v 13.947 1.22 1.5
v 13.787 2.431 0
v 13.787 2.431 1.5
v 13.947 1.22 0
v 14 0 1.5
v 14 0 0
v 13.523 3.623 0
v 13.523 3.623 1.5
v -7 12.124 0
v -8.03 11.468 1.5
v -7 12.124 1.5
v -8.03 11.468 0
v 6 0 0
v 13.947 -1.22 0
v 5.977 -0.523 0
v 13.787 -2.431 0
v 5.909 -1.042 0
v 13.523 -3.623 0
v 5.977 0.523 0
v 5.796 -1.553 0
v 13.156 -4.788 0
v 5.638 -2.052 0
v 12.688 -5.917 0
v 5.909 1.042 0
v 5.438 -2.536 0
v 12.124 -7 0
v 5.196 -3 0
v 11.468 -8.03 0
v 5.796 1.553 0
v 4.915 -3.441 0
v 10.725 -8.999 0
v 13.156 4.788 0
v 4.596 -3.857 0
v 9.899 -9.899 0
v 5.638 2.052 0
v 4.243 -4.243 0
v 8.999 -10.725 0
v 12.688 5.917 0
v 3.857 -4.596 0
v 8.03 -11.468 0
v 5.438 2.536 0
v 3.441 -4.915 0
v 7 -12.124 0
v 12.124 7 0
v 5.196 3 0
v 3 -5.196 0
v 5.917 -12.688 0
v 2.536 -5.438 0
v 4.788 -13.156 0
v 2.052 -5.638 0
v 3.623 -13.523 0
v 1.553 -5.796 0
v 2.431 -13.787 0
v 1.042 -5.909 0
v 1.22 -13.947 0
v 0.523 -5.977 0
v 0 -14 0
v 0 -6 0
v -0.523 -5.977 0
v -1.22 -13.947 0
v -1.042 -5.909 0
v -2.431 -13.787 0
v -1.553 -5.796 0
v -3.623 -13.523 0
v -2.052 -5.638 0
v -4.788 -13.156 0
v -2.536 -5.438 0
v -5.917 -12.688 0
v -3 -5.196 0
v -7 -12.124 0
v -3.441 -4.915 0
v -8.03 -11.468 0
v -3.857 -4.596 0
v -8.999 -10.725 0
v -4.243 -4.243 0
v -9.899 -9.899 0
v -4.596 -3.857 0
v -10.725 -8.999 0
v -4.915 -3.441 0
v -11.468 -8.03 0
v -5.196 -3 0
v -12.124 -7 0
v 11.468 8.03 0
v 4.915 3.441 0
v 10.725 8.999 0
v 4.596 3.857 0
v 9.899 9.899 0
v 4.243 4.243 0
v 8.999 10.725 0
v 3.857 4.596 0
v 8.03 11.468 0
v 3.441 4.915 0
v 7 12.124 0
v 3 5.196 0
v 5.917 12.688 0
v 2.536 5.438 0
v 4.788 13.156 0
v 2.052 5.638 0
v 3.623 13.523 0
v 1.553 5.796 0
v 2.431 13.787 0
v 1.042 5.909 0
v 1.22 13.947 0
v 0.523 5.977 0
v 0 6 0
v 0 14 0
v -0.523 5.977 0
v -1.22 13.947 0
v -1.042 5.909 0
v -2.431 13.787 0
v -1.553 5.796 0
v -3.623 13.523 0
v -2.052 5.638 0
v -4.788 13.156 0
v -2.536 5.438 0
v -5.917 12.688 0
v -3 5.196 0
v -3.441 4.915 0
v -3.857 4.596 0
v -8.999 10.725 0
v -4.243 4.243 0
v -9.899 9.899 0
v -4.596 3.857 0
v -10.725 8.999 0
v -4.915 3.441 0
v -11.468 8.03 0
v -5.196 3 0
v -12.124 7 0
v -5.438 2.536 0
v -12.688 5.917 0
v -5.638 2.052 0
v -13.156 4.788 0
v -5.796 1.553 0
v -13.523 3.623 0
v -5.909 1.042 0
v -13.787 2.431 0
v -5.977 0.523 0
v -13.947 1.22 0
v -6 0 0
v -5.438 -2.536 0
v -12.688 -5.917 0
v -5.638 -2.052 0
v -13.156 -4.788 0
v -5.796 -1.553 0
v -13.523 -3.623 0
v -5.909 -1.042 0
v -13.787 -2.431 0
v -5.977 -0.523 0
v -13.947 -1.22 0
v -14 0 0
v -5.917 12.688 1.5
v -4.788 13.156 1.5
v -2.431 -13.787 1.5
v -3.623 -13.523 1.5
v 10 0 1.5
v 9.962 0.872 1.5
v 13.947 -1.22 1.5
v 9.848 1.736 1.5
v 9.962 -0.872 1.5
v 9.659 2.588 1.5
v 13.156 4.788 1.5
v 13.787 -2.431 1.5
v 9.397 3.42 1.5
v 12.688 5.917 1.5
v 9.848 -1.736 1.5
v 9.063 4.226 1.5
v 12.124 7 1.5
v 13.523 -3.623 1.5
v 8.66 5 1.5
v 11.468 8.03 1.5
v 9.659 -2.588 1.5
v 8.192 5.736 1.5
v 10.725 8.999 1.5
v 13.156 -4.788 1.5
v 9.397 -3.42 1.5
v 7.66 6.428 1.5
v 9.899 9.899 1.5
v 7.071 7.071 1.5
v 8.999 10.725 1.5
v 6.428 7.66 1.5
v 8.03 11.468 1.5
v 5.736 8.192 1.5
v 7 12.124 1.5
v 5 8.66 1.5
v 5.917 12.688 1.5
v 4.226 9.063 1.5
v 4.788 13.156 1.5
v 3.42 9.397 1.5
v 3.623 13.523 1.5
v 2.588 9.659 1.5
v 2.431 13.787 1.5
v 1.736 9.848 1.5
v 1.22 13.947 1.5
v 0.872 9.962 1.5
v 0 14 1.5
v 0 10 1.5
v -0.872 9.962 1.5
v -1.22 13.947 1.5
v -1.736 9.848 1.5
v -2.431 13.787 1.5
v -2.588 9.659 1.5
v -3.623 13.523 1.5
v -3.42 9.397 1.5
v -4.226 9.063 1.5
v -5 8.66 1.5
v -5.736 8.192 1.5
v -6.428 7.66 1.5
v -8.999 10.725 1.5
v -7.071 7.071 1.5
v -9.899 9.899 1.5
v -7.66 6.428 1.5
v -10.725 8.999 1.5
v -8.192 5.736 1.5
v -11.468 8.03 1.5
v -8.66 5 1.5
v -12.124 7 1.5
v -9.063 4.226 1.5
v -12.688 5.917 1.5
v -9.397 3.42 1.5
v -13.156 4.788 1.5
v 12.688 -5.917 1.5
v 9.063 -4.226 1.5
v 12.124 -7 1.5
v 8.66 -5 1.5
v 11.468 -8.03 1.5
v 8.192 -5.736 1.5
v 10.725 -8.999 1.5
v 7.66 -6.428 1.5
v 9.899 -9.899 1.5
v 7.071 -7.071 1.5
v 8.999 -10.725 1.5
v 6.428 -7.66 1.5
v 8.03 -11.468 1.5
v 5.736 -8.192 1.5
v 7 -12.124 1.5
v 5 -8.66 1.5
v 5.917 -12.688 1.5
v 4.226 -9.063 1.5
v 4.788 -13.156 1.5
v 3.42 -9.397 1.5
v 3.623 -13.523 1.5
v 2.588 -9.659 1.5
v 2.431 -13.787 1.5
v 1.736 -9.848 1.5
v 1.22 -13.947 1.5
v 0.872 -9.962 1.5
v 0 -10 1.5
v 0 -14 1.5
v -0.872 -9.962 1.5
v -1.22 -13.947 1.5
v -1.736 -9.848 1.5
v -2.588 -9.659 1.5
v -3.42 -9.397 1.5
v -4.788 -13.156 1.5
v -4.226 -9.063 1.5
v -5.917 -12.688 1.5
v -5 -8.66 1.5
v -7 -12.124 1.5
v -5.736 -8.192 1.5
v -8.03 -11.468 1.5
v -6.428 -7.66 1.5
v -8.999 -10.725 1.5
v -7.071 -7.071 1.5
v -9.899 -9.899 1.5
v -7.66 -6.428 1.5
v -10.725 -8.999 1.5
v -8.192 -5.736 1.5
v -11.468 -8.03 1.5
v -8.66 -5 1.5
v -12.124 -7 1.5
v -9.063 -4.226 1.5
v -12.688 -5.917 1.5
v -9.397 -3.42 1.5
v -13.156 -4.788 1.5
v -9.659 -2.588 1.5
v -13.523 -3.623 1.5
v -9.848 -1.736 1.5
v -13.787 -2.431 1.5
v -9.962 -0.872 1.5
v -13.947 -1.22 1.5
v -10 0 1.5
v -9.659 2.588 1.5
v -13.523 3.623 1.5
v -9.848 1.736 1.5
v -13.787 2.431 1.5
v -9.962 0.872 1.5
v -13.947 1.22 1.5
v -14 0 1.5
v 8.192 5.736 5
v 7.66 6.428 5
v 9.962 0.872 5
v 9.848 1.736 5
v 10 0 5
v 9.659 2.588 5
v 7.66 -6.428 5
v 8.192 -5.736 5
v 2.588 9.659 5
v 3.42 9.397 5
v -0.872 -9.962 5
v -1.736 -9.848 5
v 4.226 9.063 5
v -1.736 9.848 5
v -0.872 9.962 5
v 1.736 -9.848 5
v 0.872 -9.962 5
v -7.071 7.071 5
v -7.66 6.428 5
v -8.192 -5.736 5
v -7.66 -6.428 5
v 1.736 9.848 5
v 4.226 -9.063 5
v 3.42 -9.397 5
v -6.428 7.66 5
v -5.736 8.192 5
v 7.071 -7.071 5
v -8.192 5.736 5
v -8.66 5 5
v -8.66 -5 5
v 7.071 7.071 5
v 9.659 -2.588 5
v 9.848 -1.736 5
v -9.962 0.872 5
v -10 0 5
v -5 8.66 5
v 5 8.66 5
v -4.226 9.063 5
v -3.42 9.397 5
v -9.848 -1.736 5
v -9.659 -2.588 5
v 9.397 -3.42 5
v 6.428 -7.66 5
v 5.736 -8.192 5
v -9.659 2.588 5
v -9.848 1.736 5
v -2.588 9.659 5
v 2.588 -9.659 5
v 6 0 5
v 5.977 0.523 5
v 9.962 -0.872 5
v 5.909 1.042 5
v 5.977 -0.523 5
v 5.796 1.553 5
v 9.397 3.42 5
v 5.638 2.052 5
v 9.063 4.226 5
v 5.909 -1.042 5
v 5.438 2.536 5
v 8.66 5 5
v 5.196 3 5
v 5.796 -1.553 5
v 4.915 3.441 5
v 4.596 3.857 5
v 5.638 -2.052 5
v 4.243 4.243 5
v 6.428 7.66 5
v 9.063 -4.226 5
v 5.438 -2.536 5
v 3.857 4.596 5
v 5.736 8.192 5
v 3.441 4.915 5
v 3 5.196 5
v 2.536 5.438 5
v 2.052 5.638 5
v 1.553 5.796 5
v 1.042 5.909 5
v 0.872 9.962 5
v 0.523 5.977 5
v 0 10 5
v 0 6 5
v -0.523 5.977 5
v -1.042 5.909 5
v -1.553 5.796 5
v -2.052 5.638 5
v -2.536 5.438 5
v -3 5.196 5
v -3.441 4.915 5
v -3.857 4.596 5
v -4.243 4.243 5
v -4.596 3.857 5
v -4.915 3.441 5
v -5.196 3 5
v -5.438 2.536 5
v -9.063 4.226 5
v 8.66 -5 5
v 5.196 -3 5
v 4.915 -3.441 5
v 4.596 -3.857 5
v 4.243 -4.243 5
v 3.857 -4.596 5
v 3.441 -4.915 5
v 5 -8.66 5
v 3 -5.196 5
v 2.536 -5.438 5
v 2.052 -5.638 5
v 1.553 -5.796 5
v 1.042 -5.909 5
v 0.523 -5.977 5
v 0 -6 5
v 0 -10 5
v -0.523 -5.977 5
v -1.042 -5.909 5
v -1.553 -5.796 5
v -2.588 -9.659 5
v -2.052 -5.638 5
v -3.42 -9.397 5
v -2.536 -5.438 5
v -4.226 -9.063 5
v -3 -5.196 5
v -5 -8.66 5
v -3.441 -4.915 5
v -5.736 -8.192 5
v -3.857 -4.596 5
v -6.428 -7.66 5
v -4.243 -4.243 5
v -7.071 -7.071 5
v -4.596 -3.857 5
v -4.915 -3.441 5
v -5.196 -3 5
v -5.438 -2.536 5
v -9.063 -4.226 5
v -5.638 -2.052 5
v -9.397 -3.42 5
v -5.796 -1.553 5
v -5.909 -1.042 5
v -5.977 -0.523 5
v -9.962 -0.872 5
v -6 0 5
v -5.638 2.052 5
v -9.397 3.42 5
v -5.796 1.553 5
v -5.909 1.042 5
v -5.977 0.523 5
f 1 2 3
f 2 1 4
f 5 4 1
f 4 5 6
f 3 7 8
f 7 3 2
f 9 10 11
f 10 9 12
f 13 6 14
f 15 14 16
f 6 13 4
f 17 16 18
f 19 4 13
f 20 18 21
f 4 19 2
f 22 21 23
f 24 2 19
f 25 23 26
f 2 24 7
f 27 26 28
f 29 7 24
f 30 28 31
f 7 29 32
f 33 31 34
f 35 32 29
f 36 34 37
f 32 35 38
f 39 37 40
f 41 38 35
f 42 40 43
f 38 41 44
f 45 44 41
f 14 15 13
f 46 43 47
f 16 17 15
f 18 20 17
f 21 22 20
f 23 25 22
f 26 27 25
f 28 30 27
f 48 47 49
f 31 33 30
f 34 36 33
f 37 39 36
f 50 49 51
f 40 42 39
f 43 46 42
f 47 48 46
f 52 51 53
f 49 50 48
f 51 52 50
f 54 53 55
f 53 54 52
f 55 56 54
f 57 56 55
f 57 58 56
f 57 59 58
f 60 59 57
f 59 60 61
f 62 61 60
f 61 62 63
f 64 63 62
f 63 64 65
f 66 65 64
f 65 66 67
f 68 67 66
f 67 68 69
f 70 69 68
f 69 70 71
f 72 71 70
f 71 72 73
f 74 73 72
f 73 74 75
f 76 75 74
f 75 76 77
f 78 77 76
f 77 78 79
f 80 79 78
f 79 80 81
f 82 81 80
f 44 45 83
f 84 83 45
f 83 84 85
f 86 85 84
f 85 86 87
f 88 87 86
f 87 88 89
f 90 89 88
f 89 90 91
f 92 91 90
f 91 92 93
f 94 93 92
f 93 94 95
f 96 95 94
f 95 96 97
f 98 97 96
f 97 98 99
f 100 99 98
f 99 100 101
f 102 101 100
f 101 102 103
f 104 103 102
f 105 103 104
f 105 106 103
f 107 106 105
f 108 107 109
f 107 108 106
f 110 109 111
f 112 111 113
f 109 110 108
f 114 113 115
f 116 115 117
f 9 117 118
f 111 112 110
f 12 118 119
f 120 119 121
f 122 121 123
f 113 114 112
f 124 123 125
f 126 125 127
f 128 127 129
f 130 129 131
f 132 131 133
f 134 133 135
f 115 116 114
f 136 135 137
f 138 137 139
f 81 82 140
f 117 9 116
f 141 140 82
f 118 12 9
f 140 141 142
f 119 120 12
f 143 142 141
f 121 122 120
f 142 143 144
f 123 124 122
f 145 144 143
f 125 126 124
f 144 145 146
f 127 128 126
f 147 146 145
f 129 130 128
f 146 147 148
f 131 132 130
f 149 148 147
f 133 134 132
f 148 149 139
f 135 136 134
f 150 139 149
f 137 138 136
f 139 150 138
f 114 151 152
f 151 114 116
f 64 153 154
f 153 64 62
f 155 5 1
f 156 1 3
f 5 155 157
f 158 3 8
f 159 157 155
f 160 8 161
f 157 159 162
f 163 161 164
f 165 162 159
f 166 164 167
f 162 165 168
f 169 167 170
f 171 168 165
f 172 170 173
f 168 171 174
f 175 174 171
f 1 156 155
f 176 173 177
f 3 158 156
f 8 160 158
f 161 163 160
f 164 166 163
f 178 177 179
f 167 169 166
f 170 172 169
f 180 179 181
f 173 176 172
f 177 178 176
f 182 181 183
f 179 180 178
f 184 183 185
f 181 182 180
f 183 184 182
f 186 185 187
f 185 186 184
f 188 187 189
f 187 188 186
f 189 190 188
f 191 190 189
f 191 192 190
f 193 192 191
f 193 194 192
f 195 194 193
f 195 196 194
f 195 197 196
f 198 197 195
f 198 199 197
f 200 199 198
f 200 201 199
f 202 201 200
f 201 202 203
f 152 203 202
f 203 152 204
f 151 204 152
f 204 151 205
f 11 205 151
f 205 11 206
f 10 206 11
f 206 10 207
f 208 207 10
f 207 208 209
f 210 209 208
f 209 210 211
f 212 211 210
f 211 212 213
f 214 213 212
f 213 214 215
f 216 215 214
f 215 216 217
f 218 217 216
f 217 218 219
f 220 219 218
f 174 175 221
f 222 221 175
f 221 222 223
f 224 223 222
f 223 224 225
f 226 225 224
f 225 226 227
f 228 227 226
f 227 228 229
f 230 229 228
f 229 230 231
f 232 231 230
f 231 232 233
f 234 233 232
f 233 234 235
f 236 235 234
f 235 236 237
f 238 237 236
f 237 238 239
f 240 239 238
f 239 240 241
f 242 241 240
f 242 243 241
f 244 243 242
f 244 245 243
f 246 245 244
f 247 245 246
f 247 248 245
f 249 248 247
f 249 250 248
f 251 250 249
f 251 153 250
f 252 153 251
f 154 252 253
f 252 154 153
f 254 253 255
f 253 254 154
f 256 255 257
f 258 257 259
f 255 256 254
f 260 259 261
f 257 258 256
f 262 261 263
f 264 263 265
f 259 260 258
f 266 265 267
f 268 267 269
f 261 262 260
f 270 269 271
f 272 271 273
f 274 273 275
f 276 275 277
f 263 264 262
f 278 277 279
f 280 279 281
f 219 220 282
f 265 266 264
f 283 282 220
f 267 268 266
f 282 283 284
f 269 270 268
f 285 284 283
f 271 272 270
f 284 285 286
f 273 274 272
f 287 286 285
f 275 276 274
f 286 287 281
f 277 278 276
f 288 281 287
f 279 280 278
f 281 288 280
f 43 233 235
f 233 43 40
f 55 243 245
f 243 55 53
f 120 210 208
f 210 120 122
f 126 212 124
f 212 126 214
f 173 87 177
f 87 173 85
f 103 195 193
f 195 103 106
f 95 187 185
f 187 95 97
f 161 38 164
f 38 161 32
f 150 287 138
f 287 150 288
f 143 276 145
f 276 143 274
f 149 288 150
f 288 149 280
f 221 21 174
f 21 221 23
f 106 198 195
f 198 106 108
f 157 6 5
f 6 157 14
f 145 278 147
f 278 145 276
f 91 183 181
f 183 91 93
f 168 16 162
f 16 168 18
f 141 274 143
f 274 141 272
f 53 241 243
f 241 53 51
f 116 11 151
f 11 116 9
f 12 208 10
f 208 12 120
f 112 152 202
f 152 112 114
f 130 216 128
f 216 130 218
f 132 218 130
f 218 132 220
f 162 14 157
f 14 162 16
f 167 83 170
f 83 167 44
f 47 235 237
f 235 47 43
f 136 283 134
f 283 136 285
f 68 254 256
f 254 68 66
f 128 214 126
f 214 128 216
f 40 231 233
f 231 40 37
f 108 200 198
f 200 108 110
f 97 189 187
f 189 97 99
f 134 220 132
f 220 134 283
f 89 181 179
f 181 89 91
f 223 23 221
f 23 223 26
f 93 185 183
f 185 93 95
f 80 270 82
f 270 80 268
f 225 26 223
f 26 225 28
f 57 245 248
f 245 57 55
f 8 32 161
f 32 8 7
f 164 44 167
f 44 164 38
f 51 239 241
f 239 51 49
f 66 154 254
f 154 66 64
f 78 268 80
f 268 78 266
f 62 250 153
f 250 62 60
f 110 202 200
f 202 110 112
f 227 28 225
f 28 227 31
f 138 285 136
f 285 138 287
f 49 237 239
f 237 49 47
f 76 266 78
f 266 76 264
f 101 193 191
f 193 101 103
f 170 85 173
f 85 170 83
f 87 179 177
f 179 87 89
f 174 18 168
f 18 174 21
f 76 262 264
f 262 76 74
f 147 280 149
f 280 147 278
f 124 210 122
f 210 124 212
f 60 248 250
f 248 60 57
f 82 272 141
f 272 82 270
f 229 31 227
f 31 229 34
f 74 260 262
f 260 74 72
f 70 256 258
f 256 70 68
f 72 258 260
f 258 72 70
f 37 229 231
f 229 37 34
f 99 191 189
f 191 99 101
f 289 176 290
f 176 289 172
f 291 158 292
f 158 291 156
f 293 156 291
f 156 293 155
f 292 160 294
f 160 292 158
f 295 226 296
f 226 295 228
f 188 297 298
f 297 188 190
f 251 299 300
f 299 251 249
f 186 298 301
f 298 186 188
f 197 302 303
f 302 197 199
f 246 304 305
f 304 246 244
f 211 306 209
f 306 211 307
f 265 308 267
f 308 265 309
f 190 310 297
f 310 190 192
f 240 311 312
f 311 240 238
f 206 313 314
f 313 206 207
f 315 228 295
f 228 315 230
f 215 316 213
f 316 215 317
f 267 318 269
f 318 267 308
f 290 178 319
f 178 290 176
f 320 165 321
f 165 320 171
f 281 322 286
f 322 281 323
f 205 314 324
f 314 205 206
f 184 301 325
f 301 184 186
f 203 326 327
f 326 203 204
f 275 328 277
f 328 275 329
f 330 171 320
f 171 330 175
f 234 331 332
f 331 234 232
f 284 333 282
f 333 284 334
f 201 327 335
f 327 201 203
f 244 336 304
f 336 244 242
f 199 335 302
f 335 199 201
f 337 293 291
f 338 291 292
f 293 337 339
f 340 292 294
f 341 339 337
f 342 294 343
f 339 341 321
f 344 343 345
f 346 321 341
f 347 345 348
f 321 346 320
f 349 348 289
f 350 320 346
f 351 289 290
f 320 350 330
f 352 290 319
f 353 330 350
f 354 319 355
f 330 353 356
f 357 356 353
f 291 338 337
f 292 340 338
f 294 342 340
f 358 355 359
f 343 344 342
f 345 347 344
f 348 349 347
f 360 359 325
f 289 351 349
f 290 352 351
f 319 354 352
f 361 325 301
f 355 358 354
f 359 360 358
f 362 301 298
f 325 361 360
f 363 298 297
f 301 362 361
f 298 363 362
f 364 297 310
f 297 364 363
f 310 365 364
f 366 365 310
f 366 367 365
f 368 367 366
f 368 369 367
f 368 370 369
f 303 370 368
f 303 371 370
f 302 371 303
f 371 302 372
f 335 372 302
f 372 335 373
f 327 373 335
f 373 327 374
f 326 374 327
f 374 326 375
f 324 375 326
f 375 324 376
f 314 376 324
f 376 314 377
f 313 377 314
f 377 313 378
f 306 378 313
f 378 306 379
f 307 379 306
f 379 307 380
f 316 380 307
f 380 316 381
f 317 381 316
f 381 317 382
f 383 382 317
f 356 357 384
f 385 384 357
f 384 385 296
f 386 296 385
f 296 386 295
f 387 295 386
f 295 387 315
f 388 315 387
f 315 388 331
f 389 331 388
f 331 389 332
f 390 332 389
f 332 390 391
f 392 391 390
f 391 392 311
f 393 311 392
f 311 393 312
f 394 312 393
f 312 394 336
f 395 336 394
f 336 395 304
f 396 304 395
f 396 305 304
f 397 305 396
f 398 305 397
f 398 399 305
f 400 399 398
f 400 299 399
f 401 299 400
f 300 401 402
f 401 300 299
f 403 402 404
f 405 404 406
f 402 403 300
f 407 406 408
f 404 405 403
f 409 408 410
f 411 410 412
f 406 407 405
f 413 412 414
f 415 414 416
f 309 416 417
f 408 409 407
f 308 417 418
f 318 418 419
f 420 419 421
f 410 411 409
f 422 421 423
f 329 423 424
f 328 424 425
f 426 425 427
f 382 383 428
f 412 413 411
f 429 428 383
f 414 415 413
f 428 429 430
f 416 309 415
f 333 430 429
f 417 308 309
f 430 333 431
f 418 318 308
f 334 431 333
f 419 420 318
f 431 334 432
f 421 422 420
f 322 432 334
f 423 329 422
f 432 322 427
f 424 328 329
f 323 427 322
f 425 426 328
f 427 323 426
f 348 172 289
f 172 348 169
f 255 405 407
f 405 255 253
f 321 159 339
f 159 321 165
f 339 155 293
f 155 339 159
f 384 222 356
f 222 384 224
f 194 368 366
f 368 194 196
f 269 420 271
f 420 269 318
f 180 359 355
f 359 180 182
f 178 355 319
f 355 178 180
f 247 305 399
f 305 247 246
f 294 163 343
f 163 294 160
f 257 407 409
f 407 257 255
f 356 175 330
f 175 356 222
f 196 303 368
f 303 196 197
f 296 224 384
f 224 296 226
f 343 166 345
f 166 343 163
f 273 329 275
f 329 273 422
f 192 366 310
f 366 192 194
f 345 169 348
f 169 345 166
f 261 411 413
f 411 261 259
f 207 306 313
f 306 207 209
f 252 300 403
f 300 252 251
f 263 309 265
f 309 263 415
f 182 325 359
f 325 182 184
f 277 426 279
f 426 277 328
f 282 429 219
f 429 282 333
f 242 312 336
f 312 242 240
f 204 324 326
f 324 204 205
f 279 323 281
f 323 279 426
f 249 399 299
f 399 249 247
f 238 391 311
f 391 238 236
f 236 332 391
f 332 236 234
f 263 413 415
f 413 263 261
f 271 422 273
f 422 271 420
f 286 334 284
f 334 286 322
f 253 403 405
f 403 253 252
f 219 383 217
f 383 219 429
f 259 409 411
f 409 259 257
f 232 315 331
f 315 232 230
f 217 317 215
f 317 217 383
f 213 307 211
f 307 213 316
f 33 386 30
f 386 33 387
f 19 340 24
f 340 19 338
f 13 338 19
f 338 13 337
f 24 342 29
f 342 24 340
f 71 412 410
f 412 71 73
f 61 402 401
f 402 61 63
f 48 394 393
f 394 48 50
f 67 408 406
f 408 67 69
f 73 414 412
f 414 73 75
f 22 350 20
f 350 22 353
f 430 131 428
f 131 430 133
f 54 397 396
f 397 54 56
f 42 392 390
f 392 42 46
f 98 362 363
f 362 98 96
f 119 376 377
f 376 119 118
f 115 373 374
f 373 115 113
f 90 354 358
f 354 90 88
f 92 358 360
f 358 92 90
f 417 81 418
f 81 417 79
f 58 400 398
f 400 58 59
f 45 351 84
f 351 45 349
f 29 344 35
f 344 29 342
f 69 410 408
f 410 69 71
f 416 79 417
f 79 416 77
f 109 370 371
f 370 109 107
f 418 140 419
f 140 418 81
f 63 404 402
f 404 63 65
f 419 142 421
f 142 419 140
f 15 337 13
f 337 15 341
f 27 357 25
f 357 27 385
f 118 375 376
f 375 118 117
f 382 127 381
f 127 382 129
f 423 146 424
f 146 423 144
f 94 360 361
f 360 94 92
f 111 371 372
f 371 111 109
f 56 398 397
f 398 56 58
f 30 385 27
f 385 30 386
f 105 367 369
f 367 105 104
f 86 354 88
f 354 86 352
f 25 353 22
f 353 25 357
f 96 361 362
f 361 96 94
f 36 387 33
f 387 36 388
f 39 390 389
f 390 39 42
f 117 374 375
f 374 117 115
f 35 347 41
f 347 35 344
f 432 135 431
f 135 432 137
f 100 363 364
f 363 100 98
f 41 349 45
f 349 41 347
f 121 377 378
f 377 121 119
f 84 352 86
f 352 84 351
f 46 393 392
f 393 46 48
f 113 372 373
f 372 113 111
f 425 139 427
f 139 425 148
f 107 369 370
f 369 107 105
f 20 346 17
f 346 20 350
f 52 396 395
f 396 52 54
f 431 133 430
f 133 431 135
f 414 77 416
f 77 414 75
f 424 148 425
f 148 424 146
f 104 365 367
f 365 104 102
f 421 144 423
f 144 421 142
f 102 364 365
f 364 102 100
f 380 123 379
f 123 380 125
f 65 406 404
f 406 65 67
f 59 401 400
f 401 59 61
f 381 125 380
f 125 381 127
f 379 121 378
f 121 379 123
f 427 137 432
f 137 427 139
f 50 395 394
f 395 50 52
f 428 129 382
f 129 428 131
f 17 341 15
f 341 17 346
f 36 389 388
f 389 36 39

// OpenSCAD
// Panel grommet / bushing - lines a round panel hole with a flange and a bore to protect a
// cable passing through sheet material. NOVEL general part.
//
// @desc panel grommet / bushing that lines a round hole to protect a passing cable
// @prompt Design a panel grommet in OpenSCAD: a bushing for a {panel_d} mm panel hole with a {bore} mm bore for the cable, a flange that overhangs the hole by {flange} mm, for a panel {panel_t} mm thick. Reply with a single complete OpenSCAD file.
// @param panel_d panel hole diameter, mm   [10:40]
// @param bore    cable bore diameter, mm    [3:28]
// @param flange  flange overhang, mm        [2:8]
// @param panel_t panel thickness, mm        [1:6]

panel_d = 20;
bore    = 12;
flange  = 4;
panel_t = 2;

$fn = 72;

flange_t = 1.5;

difference() {
    union() {
        cylinder(h = flange_t, d = panel_d + 2 * flange);              // flange
        cylinder(h = flange_t + panel_t + 1.5, d = panel_d);           // tube through the panel
    }
    translate([0, 0, -1]) cylinder(h = flange_t + panel_t + 4, d = bore);   // bore
}
